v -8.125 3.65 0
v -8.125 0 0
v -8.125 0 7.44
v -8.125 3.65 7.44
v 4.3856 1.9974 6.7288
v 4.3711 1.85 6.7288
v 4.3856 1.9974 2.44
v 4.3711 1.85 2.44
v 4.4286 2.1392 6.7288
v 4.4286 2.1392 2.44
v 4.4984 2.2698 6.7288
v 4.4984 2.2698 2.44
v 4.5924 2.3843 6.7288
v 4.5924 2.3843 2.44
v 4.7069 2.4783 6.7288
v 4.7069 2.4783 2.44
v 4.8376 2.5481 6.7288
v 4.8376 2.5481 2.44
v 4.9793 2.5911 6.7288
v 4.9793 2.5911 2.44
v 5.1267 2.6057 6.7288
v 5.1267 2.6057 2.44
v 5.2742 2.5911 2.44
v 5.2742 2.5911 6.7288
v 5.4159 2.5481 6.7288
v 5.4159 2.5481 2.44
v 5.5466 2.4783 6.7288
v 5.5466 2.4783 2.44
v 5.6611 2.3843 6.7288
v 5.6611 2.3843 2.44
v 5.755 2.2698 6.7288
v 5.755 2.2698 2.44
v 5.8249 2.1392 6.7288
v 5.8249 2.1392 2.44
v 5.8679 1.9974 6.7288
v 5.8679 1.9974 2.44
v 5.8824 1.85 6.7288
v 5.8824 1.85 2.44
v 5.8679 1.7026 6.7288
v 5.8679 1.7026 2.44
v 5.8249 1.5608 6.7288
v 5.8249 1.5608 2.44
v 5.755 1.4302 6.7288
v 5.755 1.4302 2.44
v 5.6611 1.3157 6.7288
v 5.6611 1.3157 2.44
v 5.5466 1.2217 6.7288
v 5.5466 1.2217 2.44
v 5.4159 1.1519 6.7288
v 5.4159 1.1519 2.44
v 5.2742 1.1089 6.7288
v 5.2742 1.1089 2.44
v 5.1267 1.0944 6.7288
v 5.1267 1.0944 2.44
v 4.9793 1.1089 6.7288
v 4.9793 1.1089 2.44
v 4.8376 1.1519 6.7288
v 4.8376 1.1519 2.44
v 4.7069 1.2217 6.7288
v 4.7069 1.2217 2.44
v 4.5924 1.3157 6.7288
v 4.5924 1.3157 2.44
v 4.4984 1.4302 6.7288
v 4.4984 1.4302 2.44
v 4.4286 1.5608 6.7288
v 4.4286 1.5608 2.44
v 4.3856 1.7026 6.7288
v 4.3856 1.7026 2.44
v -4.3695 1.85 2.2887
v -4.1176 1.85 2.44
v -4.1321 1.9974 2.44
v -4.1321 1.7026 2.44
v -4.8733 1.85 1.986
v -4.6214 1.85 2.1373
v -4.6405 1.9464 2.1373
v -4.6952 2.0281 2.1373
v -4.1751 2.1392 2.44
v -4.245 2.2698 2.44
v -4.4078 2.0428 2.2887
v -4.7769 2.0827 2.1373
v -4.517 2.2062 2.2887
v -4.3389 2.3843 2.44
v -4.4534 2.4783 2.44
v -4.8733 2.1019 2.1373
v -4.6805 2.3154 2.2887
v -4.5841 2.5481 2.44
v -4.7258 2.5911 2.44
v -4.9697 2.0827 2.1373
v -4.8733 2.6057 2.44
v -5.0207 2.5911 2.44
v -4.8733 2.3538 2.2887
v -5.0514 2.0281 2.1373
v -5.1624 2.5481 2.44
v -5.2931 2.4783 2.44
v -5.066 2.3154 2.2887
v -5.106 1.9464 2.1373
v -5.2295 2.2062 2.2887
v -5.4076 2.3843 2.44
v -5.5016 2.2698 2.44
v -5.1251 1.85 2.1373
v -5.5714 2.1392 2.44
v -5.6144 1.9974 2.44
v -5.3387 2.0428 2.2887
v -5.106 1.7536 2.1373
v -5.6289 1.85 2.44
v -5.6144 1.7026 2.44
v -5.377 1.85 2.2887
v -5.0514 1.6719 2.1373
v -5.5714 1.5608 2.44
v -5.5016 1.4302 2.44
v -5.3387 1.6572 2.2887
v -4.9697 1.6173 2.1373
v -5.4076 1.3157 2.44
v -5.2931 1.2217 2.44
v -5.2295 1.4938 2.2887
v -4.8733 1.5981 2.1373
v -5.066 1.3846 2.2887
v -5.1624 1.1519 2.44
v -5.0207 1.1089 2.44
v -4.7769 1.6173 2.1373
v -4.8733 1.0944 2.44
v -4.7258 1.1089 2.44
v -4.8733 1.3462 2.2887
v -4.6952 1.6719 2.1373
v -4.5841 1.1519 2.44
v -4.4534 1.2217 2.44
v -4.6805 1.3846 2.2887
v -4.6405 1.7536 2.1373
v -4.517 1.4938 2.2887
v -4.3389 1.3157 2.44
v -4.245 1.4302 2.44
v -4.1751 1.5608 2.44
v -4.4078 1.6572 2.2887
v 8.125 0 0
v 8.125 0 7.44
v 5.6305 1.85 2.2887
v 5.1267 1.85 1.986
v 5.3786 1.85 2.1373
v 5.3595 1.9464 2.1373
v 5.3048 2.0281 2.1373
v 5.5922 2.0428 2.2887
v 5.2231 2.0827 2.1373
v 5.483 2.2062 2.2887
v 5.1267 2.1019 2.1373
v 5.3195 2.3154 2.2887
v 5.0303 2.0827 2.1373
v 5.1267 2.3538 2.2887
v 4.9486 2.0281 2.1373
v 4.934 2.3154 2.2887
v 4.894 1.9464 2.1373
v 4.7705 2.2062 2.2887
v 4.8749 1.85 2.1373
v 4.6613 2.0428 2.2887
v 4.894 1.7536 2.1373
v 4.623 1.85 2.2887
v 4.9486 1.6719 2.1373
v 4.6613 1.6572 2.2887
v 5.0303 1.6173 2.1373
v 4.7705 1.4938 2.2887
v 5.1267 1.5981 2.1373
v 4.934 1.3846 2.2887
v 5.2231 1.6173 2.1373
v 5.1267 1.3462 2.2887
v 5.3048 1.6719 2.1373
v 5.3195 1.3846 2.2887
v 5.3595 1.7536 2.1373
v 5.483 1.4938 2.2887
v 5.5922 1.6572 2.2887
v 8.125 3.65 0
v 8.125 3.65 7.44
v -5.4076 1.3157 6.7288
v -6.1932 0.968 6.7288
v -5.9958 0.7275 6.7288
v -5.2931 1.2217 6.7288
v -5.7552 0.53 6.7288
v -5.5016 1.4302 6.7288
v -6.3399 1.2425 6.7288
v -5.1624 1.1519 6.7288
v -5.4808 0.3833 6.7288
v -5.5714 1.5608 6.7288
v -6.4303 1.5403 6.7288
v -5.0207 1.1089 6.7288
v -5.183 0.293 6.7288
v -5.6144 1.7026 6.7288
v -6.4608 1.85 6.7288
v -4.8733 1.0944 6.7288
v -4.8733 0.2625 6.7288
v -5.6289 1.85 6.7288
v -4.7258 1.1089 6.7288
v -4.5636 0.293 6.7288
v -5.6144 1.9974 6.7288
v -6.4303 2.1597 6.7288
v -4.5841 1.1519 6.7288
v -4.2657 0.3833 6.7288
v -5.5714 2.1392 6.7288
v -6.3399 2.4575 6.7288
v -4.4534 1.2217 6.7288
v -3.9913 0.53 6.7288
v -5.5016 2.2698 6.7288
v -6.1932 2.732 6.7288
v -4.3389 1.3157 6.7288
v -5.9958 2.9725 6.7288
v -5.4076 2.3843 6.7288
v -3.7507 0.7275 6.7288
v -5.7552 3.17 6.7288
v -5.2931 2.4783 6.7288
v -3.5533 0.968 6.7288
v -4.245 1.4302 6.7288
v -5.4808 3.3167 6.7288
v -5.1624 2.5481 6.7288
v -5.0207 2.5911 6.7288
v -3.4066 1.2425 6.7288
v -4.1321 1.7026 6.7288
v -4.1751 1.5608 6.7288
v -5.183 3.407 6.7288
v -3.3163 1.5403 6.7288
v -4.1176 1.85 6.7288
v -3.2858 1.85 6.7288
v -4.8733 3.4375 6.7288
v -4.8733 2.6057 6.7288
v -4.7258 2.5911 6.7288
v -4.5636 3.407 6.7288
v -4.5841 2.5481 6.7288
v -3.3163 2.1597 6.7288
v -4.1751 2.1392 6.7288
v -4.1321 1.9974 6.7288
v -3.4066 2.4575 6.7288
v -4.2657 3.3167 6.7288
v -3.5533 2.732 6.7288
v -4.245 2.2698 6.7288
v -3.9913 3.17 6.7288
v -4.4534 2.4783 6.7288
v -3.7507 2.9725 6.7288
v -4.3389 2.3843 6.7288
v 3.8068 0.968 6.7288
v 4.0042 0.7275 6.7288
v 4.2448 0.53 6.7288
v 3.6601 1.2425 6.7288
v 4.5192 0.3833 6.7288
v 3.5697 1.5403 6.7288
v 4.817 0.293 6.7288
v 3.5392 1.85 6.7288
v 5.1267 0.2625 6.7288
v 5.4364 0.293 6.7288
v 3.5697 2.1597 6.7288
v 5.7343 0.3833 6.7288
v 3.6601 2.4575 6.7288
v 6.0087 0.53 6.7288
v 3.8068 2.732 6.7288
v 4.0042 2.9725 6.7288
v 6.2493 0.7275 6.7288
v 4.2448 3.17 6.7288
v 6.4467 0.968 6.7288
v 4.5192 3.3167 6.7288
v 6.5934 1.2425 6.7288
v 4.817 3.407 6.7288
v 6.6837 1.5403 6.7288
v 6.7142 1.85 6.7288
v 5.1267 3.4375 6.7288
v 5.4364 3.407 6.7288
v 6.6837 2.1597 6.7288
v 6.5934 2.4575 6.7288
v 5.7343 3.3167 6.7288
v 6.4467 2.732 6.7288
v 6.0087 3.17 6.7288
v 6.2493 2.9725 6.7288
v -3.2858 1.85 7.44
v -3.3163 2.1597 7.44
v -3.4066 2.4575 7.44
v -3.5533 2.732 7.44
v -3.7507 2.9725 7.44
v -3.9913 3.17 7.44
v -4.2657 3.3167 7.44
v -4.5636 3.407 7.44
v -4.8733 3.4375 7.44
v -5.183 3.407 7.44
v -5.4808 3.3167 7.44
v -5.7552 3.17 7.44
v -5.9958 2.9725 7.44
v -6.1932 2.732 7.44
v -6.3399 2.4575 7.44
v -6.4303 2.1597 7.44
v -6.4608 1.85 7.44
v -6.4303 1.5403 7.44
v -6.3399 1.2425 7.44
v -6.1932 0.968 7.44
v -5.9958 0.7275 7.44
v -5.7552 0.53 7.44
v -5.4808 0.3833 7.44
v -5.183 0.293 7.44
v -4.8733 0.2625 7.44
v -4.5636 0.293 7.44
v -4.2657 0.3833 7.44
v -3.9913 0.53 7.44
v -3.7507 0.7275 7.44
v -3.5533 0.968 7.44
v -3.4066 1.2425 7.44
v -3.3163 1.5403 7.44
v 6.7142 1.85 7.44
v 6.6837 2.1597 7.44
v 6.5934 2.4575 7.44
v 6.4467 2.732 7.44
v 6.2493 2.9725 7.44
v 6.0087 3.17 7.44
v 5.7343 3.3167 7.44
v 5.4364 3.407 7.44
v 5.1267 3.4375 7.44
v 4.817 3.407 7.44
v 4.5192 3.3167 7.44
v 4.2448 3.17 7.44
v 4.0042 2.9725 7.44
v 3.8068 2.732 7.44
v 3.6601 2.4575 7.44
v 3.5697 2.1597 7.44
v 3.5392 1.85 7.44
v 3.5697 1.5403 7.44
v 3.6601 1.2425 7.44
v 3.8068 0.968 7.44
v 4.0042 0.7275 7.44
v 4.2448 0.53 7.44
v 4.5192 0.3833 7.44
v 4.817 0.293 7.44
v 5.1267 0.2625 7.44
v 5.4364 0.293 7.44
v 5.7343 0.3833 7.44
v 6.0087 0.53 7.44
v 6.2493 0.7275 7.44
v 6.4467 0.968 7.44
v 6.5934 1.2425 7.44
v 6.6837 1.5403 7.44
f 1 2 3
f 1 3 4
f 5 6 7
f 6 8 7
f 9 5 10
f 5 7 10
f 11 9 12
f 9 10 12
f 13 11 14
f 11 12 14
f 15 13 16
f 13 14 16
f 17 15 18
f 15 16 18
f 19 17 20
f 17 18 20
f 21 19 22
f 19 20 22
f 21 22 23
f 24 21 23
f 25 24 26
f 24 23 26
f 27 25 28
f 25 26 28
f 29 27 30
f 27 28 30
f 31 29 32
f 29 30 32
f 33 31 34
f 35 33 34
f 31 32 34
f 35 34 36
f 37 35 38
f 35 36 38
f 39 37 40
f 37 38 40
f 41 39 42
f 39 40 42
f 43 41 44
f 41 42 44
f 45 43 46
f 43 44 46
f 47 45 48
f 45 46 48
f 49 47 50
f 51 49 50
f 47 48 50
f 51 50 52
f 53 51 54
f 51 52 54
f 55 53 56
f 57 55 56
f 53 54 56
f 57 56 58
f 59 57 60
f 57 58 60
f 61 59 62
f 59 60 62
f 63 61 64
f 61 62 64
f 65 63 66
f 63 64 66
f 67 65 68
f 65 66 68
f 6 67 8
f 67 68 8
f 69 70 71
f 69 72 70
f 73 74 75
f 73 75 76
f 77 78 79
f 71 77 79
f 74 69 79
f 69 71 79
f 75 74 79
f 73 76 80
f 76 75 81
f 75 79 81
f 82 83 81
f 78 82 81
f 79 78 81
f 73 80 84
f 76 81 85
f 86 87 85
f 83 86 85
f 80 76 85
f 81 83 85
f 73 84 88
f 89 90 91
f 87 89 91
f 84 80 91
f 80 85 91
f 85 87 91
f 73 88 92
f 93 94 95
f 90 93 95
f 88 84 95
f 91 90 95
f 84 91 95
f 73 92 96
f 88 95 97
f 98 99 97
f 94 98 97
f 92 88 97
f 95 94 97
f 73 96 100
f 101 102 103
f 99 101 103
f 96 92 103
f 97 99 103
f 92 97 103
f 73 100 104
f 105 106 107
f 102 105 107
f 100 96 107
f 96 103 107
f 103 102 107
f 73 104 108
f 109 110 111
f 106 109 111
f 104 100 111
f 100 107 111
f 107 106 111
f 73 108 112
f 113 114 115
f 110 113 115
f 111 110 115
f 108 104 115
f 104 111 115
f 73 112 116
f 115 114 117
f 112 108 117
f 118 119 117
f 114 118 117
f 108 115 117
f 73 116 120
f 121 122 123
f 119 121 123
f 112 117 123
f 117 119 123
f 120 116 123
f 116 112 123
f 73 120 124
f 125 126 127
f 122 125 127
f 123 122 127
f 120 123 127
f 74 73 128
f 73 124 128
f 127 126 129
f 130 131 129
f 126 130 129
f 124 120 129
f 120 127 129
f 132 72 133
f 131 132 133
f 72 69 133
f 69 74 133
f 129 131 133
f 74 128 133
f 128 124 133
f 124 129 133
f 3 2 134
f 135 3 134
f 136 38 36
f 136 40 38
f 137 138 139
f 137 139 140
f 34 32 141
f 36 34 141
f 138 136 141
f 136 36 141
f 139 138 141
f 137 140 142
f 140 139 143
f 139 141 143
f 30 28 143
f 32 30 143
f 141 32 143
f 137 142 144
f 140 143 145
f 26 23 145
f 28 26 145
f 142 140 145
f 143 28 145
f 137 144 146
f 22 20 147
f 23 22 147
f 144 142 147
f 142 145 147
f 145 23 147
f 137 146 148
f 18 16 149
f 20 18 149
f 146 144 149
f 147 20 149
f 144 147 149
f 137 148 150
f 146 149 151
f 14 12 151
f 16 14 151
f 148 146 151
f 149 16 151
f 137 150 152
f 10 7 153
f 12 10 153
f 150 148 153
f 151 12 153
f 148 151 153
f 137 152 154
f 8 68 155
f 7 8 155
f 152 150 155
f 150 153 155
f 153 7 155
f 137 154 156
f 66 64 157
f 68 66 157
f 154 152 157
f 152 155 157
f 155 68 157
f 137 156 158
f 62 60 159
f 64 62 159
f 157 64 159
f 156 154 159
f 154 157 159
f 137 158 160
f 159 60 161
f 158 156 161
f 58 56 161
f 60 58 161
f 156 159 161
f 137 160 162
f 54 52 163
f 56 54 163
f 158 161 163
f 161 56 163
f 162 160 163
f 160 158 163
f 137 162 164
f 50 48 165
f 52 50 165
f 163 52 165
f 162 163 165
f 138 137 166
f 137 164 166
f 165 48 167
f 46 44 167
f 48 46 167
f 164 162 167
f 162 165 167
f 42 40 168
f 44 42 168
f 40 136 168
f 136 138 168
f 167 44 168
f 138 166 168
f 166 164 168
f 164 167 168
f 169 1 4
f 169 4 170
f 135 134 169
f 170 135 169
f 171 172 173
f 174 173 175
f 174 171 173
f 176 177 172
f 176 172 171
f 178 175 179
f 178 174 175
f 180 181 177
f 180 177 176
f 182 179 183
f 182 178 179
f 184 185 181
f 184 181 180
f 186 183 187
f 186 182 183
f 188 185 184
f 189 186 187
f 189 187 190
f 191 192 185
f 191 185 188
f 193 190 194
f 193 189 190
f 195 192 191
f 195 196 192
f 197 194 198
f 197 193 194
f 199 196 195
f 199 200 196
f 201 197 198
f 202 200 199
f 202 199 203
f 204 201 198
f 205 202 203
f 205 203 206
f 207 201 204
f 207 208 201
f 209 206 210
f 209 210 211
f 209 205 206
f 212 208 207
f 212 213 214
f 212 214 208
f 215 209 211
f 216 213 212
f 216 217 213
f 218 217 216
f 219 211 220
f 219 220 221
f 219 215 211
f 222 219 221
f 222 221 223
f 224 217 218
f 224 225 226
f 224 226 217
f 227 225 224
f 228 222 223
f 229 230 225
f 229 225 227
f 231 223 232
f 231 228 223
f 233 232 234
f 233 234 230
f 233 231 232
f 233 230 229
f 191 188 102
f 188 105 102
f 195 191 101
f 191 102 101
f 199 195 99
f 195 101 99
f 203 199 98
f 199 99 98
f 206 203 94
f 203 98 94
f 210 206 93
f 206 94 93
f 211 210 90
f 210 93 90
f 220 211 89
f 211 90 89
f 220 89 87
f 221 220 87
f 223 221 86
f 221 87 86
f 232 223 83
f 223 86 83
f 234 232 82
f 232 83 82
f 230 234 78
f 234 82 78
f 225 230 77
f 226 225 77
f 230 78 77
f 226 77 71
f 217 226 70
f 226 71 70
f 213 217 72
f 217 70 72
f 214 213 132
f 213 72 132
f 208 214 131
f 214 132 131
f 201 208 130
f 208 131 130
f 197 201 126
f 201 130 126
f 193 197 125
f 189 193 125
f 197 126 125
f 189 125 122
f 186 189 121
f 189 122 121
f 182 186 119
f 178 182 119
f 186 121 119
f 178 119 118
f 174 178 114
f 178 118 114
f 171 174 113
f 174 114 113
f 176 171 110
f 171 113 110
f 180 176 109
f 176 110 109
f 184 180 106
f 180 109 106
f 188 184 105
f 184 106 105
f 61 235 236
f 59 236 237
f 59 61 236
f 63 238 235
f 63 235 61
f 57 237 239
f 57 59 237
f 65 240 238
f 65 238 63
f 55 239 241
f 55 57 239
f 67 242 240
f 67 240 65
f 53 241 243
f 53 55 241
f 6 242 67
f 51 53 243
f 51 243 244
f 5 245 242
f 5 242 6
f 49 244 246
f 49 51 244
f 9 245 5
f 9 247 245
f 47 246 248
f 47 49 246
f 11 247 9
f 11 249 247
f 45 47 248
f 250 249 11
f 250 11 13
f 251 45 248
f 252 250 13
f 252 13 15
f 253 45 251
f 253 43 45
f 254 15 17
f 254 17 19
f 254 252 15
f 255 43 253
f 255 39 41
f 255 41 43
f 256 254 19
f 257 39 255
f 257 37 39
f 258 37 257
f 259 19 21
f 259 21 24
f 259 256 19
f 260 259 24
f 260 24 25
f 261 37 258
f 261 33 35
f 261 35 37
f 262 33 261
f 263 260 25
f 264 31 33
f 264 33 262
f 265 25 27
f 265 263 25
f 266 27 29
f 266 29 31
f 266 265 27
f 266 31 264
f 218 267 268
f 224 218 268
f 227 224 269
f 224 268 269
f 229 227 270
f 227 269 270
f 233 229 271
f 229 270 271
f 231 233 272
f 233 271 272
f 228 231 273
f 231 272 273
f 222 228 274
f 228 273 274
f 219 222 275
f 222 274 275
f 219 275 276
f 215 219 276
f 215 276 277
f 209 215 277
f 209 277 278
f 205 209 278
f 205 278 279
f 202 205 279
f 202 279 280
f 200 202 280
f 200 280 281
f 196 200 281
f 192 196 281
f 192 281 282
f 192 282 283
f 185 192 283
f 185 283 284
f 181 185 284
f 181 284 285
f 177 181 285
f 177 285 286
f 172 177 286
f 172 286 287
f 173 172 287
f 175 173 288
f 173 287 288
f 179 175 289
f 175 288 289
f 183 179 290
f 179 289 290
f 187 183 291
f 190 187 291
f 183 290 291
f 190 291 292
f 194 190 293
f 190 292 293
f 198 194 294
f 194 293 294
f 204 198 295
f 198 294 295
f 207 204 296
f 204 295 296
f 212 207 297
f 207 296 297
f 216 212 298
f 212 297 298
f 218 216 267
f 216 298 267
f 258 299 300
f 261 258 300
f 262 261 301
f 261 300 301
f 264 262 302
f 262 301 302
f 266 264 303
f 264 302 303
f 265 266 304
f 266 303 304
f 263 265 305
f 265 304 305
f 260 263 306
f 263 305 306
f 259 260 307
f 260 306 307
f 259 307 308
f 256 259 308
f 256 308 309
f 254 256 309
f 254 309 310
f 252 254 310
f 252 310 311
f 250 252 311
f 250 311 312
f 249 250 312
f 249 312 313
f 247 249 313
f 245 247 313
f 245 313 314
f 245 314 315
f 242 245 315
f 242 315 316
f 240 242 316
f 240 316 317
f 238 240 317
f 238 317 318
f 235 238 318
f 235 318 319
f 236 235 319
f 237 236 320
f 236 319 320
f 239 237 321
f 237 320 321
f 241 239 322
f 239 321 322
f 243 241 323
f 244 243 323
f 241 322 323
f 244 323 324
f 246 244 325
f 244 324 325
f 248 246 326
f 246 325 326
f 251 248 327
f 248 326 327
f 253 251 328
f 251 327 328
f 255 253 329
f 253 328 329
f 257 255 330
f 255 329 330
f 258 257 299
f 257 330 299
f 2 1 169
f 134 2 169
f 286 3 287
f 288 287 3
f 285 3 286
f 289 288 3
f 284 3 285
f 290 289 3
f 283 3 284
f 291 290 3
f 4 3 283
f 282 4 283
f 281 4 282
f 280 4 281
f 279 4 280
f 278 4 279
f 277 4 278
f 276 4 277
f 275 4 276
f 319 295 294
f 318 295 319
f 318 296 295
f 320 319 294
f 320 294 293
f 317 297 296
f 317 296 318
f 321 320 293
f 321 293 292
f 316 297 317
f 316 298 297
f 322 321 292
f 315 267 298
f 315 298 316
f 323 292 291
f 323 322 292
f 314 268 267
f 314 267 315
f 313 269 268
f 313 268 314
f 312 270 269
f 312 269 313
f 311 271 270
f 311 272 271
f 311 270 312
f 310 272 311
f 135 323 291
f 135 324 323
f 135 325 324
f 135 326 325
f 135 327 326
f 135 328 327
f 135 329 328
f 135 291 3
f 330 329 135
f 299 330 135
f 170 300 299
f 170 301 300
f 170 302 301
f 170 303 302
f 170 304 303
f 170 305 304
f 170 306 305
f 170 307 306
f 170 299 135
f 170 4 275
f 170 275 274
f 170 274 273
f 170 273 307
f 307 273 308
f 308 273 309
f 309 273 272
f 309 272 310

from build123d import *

# Parameters (mm, degrees)
SKETCH1_W                                           = 16.25
SKETCH1_H                                           = 3.65
BOSS_EXTRUDE1_DEPTH                                 = 7.44
CBORE_FOR_00_BINDING_HEAD_MACHINE_SCREW_D           = 1.5113
CBORE_FOR_00_BINDING_HEAD_MACHINE_SCREW_DEPTH       = 5
CBORE_FOR_00_BINDING_HEAD_MACHINE_SCREW_CBORE_D     = 3.175
CBORE_FOR_00_BINDING_HEAD_MACHINE_SCREW_CBORE_DEPTH = 0.7112
CBORE_FOR_00_BINDING_HEAD_MACHINE_SCREW_TIP         = 0.454040327


with BuildPart() as part:
    # Sketch1 → Boss-Extrude1 (new body)
    with BuildSketch(Plane.XY):
        with Locations((0, 1.825)):
            Rectangle(SKETCH1_W, SKETCH1_H)
    extrude(amount=BOSS_EXTRUDE1_DEPTH)

    # CBORE for #00 Binding Head Machine Screw1
    with Locations(Plane.XY.offset(7.44)):
        with Locations((-4.873259483, 1.85), (5.126740517, 1.85)):
            CounterBoreHole(CBORE_FOR_00_BINDING_HEAD_MACHINE_SCREW_D / 2, CBORE_FOR_00_BINDING_HEAD_MACHINE_SCREW_CBORE_D / 2, CBORE_FOR_00_BINDING_HEAD_MACHINE_SCREW_CBORE_DEPTH, depth=CBORE_FOR_00_BINDING_HEAD_MACHINE_SCREW_DEPTH)
            with Locations((0, 0, -(CBORE_FOR_00_BINDING_HEAD_MACHINE_SCREW_DEPTH + CBORE_FOR_00_BINDING_HEAD_MACHINE_SCREW_TIP / 2))):  # 118° drill point
                Cone(0, CBORE_FOR_00_BINDING_HEAD_MACHINE_SCREW_D / 2, CBORE_FOR_00_BINDING_HEAD_MACHINE_SCREW_TIP, mode=Mode.SUBTRACT)


solid = part.part
